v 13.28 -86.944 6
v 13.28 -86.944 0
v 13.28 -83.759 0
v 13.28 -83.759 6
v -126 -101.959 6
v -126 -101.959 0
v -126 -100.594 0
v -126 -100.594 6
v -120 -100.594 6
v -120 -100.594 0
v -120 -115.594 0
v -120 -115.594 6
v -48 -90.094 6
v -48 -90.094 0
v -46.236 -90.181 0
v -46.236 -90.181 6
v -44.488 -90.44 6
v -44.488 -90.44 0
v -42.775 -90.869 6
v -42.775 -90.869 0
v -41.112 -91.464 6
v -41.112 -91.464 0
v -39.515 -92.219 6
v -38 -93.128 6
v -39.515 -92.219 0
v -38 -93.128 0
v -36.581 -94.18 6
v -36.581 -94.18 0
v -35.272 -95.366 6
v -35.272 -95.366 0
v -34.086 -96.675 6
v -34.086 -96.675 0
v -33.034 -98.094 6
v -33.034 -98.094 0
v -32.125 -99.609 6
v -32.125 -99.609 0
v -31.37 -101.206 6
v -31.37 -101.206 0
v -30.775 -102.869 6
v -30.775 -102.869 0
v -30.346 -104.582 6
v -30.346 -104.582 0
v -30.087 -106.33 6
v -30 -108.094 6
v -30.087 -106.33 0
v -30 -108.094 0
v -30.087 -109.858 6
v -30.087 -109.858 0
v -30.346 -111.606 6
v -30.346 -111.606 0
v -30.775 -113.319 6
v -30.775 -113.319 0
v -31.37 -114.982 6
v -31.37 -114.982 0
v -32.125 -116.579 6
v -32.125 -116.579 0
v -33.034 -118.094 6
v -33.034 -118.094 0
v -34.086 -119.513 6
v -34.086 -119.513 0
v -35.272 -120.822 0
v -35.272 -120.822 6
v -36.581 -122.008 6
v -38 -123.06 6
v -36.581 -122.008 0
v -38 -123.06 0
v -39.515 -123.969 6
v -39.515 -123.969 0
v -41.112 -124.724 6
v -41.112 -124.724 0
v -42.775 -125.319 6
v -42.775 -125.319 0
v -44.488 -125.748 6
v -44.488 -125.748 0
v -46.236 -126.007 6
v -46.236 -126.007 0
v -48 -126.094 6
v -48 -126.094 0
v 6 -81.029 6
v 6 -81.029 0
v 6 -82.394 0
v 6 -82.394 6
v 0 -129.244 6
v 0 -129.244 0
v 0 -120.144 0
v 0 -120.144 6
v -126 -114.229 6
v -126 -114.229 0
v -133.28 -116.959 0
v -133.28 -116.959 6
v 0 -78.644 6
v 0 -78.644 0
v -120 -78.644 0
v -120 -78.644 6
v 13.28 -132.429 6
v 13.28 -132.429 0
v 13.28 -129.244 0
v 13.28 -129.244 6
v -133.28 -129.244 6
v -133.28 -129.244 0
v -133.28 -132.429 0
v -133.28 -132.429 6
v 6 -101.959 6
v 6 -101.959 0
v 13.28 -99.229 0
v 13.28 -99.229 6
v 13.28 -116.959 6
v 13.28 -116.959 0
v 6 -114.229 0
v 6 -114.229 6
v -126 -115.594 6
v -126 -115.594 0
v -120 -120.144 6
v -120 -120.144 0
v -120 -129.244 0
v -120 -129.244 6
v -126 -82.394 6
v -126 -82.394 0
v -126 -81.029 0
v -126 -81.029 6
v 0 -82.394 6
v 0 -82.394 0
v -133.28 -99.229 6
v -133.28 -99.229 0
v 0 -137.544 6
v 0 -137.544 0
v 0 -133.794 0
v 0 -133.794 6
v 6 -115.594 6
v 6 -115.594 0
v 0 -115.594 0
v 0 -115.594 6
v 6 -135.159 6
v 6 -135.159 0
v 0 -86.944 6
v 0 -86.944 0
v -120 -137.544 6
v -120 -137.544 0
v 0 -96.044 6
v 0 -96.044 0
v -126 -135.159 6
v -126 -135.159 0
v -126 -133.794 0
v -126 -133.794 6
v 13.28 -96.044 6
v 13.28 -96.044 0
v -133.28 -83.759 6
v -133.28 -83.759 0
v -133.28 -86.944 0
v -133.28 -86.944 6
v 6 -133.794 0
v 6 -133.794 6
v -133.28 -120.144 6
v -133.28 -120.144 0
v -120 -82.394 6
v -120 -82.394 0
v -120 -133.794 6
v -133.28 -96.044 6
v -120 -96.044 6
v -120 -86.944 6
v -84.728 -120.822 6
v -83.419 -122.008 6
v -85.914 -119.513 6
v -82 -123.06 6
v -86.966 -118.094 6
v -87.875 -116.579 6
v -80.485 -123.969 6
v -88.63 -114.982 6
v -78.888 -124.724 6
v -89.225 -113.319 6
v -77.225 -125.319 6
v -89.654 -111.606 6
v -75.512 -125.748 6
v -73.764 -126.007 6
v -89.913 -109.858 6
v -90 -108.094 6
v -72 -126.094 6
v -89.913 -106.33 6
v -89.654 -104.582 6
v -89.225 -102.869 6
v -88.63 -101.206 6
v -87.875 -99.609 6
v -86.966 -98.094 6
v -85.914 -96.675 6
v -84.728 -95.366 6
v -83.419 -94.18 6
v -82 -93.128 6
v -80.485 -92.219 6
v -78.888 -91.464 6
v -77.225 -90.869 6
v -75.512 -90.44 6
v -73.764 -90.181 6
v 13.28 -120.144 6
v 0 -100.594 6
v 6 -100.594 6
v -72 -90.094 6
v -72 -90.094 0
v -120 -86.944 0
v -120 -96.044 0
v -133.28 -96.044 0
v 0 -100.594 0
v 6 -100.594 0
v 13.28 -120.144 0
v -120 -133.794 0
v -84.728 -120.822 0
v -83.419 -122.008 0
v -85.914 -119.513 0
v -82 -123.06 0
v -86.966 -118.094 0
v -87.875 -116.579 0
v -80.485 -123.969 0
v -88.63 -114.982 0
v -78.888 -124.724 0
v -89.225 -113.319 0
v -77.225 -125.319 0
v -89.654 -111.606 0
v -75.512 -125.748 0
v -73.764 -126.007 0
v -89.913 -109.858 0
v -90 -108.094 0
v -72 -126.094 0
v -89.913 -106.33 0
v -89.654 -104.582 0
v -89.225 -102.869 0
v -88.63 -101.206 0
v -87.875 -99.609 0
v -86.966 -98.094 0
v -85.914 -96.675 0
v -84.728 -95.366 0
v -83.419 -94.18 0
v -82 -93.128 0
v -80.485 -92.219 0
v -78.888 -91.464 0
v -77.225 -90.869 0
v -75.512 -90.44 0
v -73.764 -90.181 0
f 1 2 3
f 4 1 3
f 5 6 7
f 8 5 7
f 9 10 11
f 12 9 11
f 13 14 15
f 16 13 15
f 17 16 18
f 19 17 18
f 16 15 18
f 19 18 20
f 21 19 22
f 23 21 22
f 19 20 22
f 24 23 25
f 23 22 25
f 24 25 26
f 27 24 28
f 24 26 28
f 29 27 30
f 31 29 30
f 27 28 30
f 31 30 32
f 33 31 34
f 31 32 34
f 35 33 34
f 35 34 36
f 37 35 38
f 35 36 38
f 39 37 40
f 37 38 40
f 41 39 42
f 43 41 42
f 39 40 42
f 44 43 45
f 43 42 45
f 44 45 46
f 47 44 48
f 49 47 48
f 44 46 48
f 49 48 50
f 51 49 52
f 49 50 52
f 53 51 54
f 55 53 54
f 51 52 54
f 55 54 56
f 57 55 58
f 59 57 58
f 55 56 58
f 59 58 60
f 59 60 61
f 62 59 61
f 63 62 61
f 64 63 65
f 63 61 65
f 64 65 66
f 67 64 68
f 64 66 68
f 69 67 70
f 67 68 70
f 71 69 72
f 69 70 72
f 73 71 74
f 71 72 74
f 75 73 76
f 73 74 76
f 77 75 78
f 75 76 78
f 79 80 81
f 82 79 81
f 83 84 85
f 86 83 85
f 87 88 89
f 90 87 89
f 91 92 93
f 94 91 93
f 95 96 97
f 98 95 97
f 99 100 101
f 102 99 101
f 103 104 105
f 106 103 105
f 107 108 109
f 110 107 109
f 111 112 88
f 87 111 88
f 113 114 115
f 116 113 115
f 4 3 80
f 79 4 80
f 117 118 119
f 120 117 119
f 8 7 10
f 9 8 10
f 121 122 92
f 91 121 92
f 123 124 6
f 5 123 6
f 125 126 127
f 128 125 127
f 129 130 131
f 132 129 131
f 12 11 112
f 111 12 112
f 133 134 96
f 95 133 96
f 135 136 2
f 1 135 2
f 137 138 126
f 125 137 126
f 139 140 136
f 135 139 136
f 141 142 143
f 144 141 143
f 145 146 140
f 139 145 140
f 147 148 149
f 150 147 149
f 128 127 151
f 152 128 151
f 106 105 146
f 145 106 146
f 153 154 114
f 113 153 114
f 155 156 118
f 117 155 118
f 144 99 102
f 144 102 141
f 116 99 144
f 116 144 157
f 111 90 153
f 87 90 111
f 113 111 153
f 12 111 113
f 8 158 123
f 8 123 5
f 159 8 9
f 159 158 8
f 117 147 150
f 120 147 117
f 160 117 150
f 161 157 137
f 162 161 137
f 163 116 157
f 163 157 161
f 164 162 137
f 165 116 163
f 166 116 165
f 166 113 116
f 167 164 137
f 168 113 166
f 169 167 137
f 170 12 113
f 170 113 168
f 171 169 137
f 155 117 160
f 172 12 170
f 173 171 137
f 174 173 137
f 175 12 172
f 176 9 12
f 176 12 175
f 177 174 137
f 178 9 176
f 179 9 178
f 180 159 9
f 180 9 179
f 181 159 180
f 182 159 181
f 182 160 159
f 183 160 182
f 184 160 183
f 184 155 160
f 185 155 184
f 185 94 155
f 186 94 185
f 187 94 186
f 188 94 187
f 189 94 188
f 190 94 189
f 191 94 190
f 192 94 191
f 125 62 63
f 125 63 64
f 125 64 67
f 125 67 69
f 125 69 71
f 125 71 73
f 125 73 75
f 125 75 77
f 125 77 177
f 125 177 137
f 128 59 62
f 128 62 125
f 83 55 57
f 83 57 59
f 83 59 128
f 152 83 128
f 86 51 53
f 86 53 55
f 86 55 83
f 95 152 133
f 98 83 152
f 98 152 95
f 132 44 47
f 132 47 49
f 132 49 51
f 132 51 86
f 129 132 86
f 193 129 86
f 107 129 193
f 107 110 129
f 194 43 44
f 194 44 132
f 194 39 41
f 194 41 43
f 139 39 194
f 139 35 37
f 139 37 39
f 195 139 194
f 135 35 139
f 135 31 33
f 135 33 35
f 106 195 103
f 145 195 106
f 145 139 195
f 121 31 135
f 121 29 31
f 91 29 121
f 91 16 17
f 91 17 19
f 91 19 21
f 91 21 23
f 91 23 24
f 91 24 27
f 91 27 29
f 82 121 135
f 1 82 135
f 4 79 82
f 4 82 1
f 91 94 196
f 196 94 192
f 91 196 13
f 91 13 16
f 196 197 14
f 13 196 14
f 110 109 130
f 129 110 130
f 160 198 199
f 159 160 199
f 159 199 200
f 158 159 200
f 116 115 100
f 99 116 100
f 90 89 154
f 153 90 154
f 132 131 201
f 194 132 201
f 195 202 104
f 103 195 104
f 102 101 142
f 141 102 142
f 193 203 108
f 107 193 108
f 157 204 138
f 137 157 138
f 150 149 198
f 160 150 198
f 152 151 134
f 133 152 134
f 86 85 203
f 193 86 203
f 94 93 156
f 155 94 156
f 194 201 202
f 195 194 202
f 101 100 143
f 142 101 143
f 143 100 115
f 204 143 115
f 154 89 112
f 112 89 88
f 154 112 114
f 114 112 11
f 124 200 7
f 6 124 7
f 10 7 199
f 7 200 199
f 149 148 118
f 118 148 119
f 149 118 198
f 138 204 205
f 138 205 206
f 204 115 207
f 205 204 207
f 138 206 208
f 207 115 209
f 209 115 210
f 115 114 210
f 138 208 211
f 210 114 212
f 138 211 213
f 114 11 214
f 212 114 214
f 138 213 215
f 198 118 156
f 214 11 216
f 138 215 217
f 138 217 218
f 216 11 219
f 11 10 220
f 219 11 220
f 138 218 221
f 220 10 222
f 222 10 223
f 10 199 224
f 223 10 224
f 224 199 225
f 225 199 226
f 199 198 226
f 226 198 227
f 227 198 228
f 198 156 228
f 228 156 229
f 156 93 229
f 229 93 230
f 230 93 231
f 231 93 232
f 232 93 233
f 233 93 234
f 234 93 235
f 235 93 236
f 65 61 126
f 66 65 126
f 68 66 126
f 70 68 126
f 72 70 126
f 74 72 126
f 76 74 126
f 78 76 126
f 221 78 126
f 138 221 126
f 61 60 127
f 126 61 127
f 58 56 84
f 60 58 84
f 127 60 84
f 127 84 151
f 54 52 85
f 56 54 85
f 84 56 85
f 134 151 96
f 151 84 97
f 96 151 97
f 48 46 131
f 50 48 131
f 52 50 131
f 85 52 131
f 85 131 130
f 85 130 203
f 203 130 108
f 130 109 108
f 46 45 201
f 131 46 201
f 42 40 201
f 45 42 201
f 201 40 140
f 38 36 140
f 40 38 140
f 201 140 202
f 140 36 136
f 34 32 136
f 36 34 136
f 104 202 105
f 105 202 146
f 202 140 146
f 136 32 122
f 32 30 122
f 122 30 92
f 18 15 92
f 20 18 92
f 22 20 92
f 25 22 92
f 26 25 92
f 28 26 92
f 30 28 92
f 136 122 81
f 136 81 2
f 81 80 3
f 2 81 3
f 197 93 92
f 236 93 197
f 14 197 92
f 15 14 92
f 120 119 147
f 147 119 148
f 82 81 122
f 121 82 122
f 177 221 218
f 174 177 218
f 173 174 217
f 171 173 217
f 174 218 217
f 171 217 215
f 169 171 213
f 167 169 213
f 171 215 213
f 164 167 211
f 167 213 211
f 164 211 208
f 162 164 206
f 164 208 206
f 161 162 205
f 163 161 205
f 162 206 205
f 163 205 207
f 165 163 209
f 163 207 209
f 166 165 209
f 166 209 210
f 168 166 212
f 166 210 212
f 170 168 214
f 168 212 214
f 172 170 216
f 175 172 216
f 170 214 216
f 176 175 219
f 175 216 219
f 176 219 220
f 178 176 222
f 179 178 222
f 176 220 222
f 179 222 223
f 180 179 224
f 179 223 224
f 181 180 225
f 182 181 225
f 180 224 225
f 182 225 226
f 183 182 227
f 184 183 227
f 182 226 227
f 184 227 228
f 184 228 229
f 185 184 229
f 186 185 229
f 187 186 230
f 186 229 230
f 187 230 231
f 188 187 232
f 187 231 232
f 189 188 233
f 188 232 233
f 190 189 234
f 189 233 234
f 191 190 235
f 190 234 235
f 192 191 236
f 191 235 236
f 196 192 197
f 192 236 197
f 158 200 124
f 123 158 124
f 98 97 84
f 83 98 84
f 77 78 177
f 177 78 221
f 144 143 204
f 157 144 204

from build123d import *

# Parameters (mm, degrees)
ESTRUSIONE_ESTRUSIONE1_DEPTH = 6


with BuildPart() as part:
    # Schizzo1 → Estrusione-Estrusione1 (new body)
    with BuildSketch(Plane.XY):
        Polygon((6, -115.594034624), (0, -115.594034624), (0, -100.594034624), (6, -100.594034624), (6, -101.959034624), (13.28, -99.229034624), (13.28, -96.044034624), (6, -96.044034624), (0, -96.044034624), (0, -86.944034624), (6, -86.944034624), (13.28, -86.944034624), (13.28, -83.759034624), (6, -81.029034624), (6, -82.394034624), (0, -82.394034624), (0, -78.644034624), (-120, -78.644034624), (-120, -82.394034624), (-126, -82.394034624), (-126, -81.029034624), (-133.28, -83.759034624), (-133.28, -86.944034624), (-126, -86.944034624), (-120, -86.944034624), (-120, -96.044034624), (-126, -96.044034624), (-133.28, -96.044034624), (-133.28, -99.229034624), (-126, -101.959034624), (-126, -100.594034624), (-120, -100.594034624), (-120, -115.594034624), (-126, -115.594034624), (-126, -114.229034624), (-133.28, -116.959034624), (-133.28, -120.144034624), (-126, -120.144034624), (-120, -120.144034624), (-120, -129.244034624), (-126, -129.244034624), (-133.28, -129.244034624), (-133.28, -132.429034624), (-126, -135.159034624), (-126, -133.794034624), (-120, -133.794034624), (-120, -137.544034624), (0, -137.544034624), (0, -133.794034624), (6, -133.794034624), (6, -135.159034624), (13.28, -132.429034624), (13.28, -129.244034624), (6, -129.244034624), (0, -129.244034624), (0, -120.144034624), (6, -120.144034624), (13.28, -120.144034624), (13.28, -116.959034624), (6, -114.229034624), align=None)
        with BuildLine():
            Line((-72, -90.094034624), (-48, -90.094034624))
            ThreePointArc((-48, -90.094034624), (-30, -108.094034624), (-48, -126.094034624))
            Line((-48, -126.094034624), (-72, -126.094034624))
            ThreePointArc((-72, -126.094034624), (-90, -108.094034624), (-72, -90.094034624))
        make_face(mode=Mode.SUBTRACT)
    extrude(amount=ESTRUSIONE_ESTRUSIONE1_DEPTH)


solid = part.part
